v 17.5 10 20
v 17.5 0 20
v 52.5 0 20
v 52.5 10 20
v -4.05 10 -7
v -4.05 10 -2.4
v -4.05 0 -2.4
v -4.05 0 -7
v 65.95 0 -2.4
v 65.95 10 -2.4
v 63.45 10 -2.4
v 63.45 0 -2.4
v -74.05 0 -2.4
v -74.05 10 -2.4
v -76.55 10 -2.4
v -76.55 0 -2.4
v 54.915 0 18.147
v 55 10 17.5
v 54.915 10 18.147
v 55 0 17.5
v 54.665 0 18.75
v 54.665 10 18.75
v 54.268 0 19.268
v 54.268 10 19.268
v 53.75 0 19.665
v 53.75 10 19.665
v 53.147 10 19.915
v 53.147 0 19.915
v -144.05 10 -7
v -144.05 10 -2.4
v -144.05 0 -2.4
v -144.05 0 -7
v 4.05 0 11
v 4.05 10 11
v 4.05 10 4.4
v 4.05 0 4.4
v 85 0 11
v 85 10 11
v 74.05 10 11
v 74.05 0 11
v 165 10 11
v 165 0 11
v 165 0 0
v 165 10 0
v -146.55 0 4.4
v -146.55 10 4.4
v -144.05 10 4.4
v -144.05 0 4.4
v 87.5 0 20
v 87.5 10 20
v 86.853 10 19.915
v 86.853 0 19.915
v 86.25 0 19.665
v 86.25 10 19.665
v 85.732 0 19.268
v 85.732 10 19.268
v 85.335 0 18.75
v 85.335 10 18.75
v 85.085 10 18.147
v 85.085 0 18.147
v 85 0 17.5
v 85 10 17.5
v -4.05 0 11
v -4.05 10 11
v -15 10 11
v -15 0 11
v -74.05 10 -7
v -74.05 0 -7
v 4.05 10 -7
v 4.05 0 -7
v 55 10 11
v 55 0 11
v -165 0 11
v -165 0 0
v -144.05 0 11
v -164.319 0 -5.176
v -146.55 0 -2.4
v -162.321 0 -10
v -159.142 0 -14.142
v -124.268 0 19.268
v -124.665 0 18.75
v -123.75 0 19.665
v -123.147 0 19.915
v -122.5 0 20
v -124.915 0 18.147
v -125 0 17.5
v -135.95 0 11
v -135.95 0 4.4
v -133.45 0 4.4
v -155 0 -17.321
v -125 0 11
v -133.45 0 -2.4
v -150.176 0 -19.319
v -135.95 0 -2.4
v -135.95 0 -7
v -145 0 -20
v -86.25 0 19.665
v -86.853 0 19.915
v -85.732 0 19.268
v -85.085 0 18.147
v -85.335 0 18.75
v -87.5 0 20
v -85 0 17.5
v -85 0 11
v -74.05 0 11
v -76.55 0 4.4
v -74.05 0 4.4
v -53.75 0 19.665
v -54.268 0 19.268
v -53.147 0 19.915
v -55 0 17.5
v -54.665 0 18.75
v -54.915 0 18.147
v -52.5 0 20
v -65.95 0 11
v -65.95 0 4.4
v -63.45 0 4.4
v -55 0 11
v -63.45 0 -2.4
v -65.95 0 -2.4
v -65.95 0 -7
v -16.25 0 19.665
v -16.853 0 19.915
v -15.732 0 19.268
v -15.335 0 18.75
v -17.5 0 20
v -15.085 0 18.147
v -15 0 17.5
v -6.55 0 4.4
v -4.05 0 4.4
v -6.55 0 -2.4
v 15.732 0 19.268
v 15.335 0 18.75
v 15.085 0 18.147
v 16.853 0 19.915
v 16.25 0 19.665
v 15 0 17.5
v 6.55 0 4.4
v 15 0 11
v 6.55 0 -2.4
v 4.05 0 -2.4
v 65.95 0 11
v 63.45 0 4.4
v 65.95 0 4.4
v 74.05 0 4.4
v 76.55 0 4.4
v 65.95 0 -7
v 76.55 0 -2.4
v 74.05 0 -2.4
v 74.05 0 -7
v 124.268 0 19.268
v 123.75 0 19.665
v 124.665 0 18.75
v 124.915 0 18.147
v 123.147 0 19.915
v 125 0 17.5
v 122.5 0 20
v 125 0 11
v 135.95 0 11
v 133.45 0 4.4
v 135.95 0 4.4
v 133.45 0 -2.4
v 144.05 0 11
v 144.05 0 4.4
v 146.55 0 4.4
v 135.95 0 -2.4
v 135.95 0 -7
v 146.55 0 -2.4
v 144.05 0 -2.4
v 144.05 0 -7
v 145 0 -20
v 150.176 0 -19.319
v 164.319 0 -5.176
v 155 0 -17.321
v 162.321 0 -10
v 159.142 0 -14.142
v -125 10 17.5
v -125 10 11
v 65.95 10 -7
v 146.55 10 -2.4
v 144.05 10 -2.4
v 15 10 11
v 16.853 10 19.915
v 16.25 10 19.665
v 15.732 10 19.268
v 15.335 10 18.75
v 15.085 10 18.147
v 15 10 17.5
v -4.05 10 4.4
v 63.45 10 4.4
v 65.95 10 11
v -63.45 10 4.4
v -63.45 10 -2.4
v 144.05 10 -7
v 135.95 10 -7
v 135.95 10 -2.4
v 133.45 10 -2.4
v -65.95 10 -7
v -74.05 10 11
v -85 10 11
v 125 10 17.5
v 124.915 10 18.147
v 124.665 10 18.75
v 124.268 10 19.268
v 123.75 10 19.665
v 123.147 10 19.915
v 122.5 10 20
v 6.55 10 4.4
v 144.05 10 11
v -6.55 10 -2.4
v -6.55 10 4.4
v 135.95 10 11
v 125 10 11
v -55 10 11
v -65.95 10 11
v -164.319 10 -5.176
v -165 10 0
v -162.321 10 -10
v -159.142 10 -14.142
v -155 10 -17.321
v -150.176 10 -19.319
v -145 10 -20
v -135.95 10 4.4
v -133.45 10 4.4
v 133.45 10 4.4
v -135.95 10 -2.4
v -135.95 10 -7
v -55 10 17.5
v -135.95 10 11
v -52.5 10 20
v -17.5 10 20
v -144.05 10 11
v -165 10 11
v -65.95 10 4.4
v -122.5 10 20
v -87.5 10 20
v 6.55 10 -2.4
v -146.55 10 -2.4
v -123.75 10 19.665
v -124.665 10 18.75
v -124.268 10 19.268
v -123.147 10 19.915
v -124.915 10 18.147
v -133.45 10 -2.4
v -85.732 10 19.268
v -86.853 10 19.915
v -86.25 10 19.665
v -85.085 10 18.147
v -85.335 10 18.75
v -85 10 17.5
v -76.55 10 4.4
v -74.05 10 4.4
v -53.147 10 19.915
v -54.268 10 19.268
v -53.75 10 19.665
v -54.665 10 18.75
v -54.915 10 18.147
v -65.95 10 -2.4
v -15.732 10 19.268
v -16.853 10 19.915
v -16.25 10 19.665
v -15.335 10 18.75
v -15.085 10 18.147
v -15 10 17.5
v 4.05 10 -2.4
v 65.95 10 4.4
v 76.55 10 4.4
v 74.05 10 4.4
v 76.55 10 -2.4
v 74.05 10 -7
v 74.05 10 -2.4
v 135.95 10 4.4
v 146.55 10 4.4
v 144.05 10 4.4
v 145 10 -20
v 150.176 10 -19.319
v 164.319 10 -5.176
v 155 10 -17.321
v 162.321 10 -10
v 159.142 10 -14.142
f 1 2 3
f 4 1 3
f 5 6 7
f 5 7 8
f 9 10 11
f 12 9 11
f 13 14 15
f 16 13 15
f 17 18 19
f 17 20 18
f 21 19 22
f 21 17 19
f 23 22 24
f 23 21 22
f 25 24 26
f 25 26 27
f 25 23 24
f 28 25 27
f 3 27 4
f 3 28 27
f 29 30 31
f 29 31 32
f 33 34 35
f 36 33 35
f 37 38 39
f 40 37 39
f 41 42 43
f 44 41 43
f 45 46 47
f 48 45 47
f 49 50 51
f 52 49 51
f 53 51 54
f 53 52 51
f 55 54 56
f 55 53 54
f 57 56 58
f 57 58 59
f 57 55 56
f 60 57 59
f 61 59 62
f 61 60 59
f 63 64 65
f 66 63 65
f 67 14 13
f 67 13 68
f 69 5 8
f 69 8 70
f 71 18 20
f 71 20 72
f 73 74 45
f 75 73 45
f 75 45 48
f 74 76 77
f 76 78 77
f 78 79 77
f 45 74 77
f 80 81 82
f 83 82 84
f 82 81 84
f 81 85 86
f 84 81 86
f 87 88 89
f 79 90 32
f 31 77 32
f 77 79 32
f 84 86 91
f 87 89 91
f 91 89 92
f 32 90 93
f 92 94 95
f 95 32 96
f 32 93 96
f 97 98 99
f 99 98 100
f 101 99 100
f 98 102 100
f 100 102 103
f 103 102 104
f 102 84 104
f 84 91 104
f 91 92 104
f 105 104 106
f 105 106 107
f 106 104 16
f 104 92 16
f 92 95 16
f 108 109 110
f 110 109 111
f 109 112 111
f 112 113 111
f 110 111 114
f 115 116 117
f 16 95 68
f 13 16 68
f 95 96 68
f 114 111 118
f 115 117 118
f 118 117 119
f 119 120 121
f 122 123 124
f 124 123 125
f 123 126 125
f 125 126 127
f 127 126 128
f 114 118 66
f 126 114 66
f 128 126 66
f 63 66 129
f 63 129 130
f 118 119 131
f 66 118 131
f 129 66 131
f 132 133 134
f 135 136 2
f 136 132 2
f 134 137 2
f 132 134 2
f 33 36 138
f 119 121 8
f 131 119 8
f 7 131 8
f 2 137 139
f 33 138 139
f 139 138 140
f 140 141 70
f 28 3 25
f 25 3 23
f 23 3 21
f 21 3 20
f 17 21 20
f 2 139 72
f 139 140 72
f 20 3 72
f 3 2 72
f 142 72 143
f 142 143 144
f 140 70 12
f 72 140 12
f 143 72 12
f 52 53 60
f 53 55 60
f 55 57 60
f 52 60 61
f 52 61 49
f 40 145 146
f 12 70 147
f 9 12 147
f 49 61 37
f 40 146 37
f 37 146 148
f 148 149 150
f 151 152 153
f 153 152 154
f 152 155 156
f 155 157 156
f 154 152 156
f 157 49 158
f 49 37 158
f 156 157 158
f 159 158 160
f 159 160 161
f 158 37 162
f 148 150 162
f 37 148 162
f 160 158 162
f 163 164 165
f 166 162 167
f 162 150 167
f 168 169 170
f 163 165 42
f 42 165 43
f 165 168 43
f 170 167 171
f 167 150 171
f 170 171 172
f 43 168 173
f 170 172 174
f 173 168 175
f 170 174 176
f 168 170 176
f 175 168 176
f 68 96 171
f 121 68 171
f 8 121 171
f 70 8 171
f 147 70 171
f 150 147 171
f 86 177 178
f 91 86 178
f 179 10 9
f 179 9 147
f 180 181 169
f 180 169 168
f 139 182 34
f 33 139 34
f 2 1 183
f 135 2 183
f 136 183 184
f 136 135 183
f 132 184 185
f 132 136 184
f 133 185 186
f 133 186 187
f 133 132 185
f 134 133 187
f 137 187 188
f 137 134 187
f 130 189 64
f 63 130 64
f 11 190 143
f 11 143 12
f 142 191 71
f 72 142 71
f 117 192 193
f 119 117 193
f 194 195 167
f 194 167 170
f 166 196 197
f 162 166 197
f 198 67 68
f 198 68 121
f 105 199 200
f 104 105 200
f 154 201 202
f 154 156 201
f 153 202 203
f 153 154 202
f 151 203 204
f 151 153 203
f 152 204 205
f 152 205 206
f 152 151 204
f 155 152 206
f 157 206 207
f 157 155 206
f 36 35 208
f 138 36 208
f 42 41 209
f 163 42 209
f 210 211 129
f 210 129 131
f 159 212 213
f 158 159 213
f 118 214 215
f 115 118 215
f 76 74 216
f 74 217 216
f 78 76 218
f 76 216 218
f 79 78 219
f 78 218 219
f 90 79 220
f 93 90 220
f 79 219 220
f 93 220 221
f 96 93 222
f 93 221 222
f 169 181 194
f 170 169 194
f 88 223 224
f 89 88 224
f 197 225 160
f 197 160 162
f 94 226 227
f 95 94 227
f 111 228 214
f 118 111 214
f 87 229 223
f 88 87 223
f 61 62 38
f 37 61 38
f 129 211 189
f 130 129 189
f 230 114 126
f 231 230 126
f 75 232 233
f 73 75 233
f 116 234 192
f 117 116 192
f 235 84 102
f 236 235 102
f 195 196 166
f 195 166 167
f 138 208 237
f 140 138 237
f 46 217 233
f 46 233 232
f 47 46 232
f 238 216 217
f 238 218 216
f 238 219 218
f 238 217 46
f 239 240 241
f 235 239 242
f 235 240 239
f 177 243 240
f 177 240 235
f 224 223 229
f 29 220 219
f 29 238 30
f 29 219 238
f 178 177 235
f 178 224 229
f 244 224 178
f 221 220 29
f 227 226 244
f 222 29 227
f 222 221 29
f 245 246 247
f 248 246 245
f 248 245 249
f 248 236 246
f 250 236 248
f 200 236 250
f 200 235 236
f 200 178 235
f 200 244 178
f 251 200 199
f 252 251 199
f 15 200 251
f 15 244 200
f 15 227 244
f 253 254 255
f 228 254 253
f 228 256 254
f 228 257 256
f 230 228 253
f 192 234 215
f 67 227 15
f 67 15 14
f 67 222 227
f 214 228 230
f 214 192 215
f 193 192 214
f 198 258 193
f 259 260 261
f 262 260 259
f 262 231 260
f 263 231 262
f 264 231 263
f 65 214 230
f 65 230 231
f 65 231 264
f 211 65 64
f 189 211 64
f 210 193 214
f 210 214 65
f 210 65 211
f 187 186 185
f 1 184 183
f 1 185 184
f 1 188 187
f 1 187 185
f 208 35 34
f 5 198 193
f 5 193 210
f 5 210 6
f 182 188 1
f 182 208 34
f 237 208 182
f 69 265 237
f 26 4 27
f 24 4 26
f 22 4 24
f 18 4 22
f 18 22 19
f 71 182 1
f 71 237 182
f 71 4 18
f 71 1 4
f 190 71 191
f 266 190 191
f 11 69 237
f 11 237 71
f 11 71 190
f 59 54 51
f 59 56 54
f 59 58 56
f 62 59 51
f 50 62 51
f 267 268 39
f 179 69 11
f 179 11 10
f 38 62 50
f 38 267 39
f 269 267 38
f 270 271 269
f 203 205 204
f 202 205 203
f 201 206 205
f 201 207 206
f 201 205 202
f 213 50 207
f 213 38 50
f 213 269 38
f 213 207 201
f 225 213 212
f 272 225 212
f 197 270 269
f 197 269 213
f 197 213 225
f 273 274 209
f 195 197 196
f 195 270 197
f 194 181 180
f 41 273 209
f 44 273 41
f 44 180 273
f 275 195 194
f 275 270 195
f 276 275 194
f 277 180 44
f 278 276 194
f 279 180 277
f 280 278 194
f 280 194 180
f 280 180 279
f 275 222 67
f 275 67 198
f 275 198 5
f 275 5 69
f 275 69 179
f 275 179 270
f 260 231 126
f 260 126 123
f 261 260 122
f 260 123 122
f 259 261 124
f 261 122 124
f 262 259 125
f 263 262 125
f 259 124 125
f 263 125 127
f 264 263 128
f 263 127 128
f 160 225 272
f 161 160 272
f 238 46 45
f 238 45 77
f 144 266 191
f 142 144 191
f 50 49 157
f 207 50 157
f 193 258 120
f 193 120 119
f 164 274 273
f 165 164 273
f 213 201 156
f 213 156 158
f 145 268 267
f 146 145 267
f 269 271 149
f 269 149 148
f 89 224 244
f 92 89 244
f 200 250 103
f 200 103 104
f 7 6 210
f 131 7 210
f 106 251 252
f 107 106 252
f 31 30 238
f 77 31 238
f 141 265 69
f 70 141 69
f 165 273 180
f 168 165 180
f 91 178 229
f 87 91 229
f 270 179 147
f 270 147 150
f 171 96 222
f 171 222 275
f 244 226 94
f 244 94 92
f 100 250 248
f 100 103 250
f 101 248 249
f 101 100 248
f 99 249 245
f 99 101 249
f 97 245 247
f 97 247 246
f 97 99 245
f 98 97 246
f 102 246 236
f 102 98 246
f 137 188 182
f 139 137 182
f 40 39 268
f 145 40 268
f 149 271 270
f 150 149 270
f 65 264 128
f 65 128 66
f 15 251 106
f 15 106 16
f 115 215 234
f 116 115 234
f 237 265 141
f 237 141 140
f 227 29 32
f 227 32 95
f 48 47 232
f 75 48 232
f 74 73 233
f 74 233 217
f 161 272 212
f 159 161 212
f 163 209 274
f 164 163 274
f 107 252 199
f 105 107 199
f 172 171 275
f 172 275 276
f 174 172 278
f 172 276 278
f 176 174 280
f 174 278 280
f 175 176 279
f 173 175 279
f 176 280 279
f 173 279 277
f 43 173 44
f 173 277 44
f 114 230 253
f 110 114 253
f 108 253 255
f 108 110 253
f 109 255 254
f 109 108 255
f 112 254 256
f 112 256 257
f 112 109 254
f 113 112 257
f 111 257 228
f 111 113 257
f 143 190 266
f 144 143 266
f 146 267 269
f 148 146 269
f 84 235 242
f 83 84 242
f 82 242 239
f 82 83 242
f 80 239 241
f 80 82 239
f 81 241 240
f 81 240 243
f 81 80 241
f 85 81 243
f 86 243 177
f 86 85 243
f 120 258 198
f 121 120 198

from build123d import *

# Parameters (mm, degrees)
SKETCH1_W                  = 330
SKETCH1_H                  = 40
BOSS_EXTRUDE1_DEPTH        = 10
SKETCH2_W                  = 10.95
SKETCH2_H                  = 9
SKETCH2_W_2                = 8.1
SKETCH2_H_2                = 6.6
SKETCH2_H_3                = 6.8
SKETCH2_W_3                = 2.5
SKETCH2_H_4                = 4.6
CUT_EXTRUDE1_DEPTH         = 167.508258053
FILLET1_R                  = 2.5
LPATTERN1_COUNT            = 3
LPATTERN1_PITCH            = 70
FILLET1_OF_LPATTERN1_R     = 2.5
LPATTERN1_COL_COUNT        = 3
LPATTERN1_COL_PITCH        = 70
FILLET1_OF_LPATTERN1_COL_R = 2.5
SKETCH3_W                  = 10
SKETCH3_H                  = 9
CUT_EXTRUDE2_DEPTH         = 167.508258053
FILLET2_R                  = 20


with BuildPart() as part:
    # Sketch1 → Boss-Extrude1 (new body)
    with BuildSketch(Plane(origin=(0, 0, 0), x_dir=(1, 0, 0), z_dir=(0, 1, 0))):
        Rectangle(SKETCH1_W, SKETCH1_H)
    extrude(amount=BOSS_EXTRUDE1_DEPTH)

    # Sketch2 → Cut-Extrude1 (cut, through all)
    with BuildSketch(Plane(origin=(0, 10, 0), x_dir=(1, 0, 0), z_dir=(0, 1, 0))):
        with Locations((9.525, -15.5)):
            Rectangle(SKETCH2_W, SKETCH2_H)
        with Locations((0, -15.5)):
            Rectangle(SKETCH2_W_2, SKETCH2_H)
        with Locations((-9.525, -15.5)):
            Rectangle(SKETCH2_W, SKETCH2_H)
        with Locations((0, -7.7)):
            Rectangle(SKETCH2_W_2, SKETCH2_H_2)
        with Locations((0, -1)):
            Rectangle(SKETCH2_W_2, SKETCH2_H_3)
        with Locations((-5.3, -1)):
            Rectangle(SKETCH2_W_3, SKETCH2_H_3)
        with Locations((0, 4.7)):
            Rectangle(SKETCH2_W_2, SKETCH2_H_4)
        with Locations((5.3, -1)):
            Rectangle(SKETCH2_W_3, SKETCH2_H_3)
    cut_extrude1 = extrude(amount=-CUT_EXTRUDE1_DEPTH, mode=Mode.SUBTRACT)

    # Fillet1
    fillet1_edges = [part.edges().sort_by_distance(p)[0] for p in [
        (15, 5, 20),
        (-15, 5, 20),
    ]]
    fillet(fillet1_edges, radius=FILLET1_R)

    # LPattern1: Cut-Extrude1 ×3
    with Locations(*[(i * LPATTERN1_PITCH, 0, 0) for i in range(1, LPATTERN1_COUNT)]):
        add(cut_extrude1, mode=Mode.SUBTRACT)

    # Fillet1 of LPattern1
    fillet1_of_lpattern1_edges = [part.edges().sort_by_distance(p)[0] for p in [
        (85, 5, 20),
        (55, 5, 20),
        (155, 5, 20),
        (125, 5, 20),
    ]]
    fillet(fillet1_of_lpattern1_edges, radius=FILLET1_OF_LPATTERN1_R)

    # LPattern1 col: Cut-Extrude1 ×3
    with Locations(*[(-i * LPATTERN1_COL_PITCH, 0, 0) for i in range(1, LPATTERN1_COL_COUNT)]):
        add(cut_extrude1, mode=Mode.SUBTRACT)

    # Fillet1 of LPattern1 col
    fillet1_of_lpattern1_col_edges = [part.edges().sort_by_distance(p)[0] for p in [
        (-55, 5, 20),
        (-85, 5, 20),
        (-125, 5, 20),
        (-155, 5, 20),
    ]]
    fillet(fillet1_of_lpattern1_col_edges, radius=FILLET1_OF_LPATTERN1_COL_R)

    # Sketch3 → Cut-Extrude2 (cut, through all)
    with BuildSketch(Plane(origin=(0, 10, 0), x_dir=(1, 0, 0), z_dir=(0, 1, 0))):
        with Locations((-160, -15.5)):
            Rectangle(SKETCH3_W, SKETCH3_H)
    cut_extrude2 = extrude(amount=-CUT_EXTRUDE2_DEPTH, mode=Mode.SUBTRACT)

    # Mirror1: Cut-Extrude2 across plane
    add(cut_extrude2.mirror(Plane(origin=(0, 0, 0), x_dir=(0, 0, 1), z_dir=(1, 0, 0))), mode=Mode.SUBTRACT)

    # Fillet2
    fillet2_edges = [part.edges().sort_by_distance(p)[0] for p in [
        (-165, 5, -20),
        (165, 5, -20),
    ]]
    fillet(fillet2_edges, radius=FILLET2_R)


solid = part.part
